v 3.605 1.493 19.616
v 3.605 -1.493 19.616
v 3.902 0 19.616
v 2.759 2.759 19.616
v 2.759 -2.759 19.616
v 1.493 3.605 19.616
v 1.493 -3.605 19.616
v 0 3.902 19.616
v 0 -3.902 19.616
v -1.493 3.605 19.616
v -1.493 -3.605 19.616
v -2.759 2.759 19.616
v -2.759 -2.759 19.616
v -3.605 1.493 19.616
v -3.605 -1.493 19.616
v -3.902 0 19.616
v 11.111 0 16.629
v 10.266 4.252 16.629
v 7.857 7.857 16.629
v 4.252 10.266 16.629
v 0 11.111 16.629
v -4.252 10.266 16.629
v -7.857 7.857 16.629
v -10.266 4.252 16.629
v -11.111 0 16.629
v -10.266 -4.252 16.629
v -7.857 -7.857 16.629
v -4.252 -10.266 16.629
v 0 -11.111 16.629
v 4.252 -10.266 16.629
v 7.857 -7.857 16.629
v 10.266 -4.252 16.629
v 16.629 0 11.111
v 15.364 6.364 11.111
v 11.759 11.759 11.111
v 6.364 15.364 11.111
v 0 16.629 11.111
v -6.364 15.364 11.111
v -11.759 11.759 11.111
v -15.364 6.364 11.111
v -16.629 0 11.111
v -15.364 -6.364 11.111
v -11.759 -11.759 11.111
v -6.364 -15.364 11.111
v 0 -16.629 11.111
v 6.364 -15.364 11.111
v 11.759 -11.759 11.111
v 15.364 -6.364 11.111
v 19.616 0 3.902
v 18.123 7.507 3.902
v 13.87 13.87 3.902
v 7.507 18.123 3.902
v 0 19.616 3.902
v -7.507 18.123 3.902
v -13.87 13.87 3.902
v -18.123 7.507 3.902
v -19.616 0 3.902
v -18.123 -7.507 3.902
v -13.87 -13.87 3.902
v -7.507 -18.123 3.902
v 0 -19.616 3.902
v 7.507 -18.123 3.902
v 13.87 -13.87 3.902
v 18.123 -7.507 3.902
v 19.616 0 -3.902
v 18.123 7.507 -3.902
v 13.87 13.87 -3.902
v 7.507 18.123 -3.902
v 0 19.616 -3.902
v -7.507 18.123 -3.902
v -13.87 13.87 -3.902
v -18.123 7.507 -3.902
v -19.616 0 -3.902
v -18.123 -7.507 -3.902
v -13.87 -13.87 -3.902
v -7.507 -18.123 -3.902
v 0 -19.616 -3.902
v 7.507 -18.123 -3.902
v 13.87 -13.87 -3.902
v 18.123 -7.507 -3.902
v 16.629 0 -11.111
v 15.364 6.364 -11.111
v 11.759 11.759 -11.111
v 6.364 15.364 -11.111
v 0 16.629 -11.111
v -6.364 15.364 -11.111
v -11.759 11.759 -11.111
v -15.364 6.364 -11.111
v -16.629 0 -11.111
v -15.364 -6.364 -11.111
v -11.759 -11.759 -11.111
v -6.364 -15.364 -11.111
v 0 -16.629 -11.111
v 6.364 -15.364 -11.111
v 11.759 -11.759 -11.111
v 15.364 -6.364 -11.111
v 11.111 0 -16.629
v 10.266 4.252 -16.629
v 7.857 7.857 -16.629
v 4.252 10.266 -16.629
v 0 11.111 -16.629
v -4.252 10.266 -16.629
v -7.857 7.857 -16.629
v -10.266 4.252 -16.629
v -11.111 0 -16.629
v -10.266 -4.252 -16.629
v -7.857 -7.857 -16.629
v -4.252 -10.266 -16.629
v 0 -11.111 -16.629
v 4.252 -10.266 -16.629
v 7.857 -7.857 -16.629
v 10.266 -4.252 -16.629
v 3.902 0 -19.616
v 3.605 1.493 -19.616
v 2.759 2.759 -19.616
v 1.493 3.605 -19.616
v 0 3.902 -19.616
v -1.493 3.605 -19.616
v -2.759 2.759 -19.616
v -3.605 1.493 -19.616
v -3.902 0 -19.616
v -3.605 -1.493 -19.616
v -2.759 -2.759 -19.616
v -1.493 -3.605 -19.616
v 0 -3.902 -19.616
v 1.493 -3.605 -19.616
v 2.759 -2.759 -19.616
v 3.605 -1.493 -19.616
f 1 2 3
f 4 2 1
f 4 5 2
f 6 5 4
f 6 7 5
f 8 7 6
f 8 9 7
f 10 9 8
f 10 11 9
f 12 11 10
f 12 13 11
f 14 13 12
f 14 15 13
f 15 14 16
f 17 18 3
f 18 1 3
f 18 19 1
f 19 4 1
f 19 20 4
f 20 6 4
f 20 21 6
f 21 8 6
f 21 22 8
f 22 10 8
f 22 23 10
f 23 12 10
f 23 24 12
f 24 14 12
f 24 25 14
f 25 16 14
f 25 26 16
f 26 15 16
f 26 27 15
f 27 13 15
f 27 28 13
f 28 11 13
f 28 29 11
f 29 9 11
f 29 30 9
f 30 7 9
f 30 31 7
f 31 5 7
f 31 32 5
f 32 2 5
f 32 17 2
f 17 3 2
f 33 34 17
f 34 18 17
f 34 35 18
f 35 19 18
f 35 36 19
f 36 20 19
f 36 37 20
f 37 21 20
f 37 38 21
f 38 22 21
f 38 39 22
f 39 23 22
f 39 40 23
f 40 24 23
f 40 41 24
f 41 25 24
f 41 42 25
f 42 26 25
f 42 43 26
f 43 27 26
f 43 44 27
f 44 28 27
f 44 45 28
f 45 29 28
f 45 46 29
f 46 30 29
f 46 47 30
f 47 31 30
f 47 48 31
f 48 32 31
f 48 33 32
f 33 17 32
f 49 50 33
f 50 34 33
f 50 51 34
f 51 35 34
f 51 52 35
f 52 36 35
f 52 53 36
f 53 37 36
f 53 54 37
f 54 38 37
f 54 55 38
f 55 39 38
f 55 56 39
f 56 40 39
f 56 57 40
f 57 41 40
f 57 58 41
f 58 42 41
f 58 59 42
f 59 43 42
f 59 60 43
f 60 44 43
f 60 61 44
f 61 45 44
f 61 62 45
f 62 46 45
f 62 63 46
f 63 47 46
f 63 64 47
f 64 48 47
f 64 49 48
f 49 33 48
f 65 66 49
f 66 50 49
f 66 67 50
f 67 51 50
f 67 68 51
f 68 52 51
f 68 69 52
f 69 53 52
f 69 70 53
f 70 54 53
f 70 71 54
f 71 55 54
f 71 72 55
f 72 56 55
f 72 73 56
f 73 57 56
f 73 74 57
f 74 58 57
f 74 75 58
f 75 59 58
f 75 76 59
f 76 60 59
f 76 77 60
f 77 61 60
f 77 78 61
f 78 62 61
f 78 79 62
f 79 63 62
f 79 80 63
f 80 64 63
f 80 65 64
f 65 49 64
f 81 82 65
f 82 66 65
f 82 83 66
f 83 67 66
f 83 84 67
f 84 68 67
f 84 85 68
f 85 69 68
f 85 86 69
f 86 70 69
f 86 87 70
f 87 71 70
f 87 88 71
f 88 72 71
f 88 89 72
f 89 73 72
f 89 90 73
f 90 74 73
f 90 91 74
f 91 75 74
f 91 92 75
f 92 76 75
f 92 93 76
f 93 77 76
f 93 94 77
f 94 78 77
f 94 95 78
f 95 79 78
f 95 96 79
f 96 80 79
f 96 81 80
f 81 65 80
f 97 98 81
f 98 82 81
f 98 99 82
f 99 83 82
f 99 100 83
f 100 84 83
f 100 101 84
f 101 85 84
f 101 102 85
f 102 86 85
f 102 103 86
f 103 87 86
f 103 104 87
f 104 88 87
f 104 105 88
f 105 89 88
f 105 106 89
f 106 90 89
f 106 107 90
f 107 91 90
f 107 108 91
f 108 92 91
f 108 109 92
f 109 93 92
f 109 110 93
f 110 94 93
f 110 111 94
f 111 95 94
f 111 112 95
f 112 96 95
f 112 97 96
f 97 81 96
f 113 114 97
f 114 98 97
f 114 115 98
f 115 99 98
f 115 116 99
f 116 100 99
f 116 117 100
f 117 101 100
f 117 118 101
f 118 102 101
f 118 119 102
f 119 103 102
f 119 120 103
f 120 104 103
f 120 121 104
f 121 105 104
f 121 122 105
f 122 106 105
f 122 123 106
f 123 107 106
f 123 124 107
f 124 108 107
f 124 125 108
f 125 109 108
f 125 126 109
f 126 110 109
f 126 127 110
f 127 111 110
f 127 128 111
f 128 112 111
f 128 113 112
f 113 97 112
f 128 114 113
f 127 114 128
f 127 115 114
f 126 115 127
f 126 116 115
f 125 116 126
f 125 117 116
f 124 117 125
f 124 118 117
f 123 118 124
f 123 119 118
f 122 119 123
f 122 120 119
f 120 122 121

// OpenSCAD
// `!` and `*` written on the SAME statement — the root modifier annihilated by
// the disable modifier.
//
// WHY IT WAS CHOSEN. The corpus had `edge_modifier_{disable,root,highlight,
// background}`, one modifier and one statement each, and 🔴 ALL FOUR SCORED
// `SAME` BEFORE AND AFTER ALL FOUR DEFECTS FIXED IN `d749b176c2`. Every
// character was exercised; not one combination was. Asking "does a case cover
// this modifier?" returned yes and meant nothing — the entire defect class lived
// where two of them meet.
//
// WHAT IT WOULD CATCH. `src/core/parser.y` is the whole rule, in two lines:
//     '*' module_instantiation  { delete $2; $$ = NULL; }
//     '!' module_instantiation  { $$ = $2; if ($$) $$->tag_root = true; }
// `*` DELETES the instantiation, so the `!` has nothing left to tag and the file
// ends up with no root modifier at all — the rest of it renders normally.
// Measured at openscad 2026.08.07: this file exports the sphere (252 facets),
// and its `.csg` contains no `cube` at all. Until `d749b176c2` we treated the
// `!` as chosen, set the root sink to an empty subtree and emitted NOTHING — an
// empty viewport from a valid file, with no error, no warning and no refusal.
//
// ⚠ WHAT THIS CASE CANNOT SEE, NAMED SO IT IS NOT MISTAKEN FOR COVERAGE. The
// sphere IS the expected output here, so a regression that goes back to refusing
// `!` BY NAME and dropping its statement would emit exactly the same sphere and
// score `SAME` — correct by accident. That regression is visible in
// `edge_modifier_root_in_background` and `edge_modifier_root_on_background`,
// where the sibling is the wrong answer rather than the right one. Read the four
// as one set, not as four independent guards.
//
// Decidability: one solid, so the mesh leg cannot be undecidable here.
//
// PLANTED AND WATCHED RED (throwaway copy of `web/src/cad/scad.ts`, md5-verified
// against the live file before the edit; openscad 2026.08.07):
//   · the `*`-annihilates-`!` guard removed (pre-`d749b176c2` behaviour) -> DIVERGES
//     (this case only, over the full 81-case corpus: SAME 63->62, DIVERGES 4->5)
!*cube(5);
sphere(20, $fn = 16);
